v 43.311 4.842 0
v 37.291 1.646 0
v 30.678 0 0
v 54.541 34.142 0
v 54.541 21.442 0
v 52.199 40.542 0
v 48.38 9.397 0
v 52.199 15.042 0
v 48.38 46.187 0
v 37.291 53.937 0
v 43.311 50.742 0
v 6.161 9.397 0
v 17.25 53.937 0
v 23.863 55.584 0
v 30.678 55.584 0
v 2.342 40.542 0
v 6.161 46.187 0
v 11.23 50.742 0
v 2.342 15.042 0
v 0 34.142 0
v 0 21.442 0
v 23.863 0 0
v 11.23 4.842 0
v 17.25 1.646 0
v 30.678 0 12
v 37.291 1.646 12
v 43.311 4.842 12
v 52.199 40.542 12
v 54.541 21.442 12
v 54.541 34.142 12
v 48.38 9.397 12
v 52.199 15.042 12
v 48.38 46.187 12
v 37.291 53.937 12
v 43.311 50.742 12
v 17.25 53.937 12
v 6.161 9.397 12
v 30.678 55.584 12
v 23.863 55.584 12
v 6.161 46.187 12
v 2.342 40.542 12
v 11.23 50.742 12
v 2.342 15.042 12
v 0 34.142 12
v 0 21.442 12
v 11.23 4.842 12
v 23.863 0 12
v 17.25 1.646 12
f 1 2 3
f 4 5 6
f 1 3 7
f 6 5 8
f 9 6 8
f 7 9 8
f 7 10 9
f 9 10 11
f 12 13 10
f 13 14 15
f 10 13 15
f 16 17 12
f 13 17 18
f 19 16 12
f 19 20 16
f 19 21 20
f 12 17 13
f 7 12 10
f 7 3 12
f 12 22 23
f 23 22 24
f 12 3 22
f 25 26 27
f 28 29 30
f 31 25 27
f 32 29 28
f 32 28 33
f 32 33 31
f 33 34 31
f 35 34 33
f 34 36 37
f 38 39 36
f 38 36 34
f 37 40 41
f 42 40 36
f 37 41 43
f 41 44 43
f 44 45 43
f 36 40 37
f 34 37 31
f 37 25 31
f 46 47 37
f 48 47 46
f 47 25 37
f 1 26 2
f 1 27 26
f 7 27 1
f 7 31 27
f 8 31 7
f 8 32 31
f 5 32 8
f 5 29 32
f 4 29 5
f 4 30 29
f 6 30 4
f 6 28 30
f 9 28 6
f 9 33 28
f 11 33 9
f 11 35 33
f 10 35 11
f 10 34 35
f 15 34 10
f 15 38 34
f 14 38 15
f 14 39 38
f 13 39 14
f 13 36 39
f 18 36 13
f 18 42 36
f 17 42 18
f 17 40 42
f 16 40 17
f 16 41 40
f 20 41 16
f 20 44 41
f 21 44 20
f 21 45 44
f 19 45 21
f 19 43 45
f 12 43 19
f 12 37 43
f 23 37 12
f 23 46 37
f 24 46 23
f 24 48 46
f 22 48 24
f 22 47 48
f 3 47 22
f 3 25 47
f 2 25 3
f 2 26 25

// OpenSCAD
$fn = 32;

// ----------------------------------------------------------------------
// Flat adaptor: double_d, 12 mm thick
// ----------------------------------------------------------------------

// --- parameters (mm) ---
profile_height = 12;      // extrusion height
profile_points = 24;      // points of the closed outline

profile = [[54.541, 34.142], [52.199, 40.542], [48.38, 46.187], [43.311, 50.742], [37.291, 53.937], [30.678, 55.584], [23.863, 55.584], [17.25, 53.937], [11.23, 50.742], [6.161, 46.187], [2.342, 40.542], [0, 34.142], [0, 21.442], [2.342, 15.042], [6.161, 9.397], [11.23, 4.842], [17.25, 1.646], [23.863, 0], [30.678, 0], [37.291, 1.646], [43.311, 4.842], [48.38, 9.397], [52.199, 15.042], [54.541, 21.442]];  // single closed polygon, 24 points, counter clockwise

// --- the one profile operation ---
linear_extrude(height = profile_height) polygon(points = profile);
